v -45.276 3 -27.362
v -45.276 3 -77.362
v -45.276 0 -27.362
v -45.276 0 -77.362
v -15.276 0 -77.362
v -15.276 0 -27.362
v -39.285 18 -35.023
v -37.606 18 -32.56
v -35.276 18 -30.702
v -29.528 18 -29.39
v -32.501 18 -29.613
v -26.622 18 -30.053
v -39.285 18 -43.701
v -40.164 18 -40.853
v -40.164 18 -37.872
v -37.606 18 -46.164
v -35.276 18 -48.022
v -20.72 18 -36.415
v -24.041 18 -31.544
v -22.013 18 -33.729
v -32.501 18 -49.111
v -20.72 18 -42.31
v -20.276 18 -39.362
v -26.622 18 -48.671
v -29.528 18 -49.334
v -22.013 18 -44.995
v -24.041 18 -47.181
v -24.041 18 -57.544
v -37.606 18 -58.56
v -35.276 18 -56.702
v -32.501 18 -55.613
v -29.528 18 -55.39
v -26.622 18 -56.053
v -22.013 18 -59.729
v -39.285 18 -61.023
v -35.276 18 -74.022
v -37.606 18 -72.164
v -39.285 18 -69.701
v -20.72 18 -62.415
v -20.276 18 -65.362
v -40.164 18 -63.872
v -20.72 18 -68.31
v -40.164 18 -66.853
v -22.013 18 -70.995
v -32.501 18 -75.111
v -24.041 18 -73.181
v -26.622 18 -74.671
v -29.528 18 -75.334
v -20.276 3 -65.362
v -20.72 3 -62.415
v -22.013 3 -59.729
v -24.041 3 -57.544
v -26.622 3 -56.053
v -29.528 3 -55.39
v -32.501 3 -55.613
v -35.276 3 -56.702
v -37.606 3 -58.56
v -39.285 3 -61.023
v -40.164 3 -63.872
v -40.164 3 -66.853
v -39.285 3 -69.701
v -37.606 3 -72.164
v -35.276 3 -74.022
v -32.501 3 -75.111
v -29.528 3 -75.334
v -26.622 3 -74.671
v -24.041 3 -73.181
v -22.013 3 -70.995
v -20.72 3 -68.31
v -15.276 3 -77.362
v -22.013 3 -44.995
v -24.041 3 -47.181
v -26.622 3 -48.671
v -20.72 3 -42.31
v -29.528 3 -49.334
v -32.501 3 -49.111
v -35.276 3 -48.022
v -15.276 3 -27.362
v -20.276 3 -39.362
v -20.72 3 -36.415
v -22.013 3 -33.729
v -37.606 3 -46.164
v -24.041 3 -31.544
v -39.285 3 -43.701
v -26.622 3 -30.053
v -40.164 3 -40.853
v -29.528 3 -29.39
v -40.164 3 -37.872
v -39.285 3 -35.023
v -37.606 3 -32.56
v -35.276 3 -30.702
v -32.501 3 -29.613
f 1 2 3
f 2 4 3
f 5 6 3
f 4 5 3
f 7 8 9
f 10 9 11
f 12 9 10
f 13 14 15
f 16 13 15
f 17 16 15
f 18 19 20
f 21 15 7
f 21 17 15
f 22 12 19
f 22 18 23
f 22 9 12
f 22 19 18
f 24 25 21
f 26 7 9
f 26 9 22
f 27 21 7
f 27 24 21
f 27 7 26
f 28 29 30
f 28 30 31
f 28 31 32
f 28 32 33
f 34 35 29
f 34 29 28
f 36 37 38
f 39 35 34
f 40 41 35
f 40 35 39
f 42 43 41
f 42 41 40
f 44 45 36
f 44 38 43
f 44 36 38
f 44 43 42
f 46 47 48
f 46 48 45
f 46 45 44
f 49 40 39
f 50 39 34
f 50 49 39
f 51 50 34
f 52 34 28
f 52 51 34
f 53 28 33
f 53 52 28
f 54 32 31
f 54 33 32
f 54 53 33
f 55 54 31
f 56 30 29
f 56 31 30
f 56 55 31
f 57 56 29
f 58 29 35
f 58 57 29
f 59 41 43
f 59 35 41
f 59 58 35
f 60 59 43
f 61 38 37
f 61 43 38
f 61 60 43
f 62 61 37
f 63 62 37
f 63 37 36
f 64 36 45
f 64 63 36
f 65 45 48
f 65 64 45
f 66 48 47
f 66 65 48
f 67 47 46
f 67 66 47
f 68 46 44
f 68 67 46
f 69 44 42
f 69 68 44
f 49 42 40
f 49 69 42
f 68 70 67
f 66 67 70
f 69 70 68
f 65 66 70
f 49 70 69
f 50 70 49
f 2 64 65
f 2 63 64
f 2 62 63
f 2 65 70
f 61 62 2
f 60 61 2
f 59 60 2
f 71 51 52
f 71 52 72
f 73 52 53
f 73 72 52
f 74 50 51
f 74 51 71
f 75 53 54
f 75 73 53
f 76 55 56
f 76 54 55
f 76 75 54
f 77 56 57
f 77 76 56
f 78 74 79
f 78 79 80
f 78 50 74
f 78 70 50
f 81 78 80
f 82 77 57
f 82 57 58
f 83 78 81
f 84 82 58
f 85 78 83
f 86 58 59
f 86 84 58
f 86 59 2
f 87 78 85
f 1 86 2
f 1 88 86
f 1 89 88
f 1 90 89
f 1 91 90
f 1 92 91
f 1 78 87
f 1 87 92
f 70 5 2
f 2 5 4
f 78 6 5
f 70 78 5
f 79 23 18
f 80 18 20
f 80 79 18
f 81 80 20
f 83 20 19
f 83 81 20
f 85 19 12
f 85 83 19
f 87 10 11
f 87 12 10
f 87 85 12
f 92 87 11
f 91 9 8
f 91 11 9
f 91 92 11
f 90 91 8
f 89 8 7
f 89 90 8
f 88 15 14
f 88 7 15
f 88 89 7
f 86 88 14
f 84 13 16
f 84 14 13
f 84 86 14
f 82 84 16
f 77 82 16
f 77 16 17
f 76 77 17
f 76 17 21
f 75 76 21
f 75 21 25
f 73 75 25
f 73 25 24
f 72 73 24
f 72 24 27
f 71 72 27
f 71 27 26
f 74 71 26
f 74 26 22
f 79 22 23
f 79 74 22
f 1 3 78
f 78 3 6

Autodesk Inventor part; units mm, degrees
ref_plane "YZ Plane" through (0, 0, 0) normal (1, 0, 0) x (0, 1, 0)
ref_plane "XZ Plane" through (0, 0, 0) normal (0, 1, 0) x (-1, 0, 0)
ref_plane "XY Plane" through (0, 0, 0) normal (0, 0, 1) x (1, 0, 0)
sketch "Skizze1" plane through (0, 0, 0) normal (0, 1, 0) x (-1, 0, 0)
  line L0 (45.2756, -27.3622) -> (15.2756, -27.3622)
  line L1 (15.2756, -27.3622) -> (15.2756, -77.3622)
  line L2 (15.2756, -77.3622) -> (45.2756, -77.3622)
  line L3 (45.2756, -77.3622) -> (45.2756, -27.3622)
  point P0 (0, 0)
  dimension "d0" = 50
  dimension "d1" = 30
extrude "Extrusion1" add sketch "Skizze1" along normal blind 3
sketch "Skizze2" plane through (0, 3, 0) normal (0, 1, 0) x (1, 0, 0)
  circle A0 centre (-30.2756, 39.3622) radius 10
  circle A1 centre (-30.2756, 65.3622) radius 10
  line L0 (-45.2756, 77.3622) -> (-45.2756, 27.3622) projected
  line L1 (-45.2756, 27.3622) -> (-15.2756, 27.3622) projected
  line L2 (-15.2756, 77.3622) -> (-45.2756, 77.3622) projected
  point P0 (0, 0)
  dimension "d4" = 20
  dimension "d5" = 20
  dimension "d6" = 15
  dimension "d7" = 15
  dimension "d10" = 12
  dimension "d11" = 12
extrude "Extrusion2" add sketch "Skizze2" along normal blind 15
properties part number "Ultraschallsensor"
